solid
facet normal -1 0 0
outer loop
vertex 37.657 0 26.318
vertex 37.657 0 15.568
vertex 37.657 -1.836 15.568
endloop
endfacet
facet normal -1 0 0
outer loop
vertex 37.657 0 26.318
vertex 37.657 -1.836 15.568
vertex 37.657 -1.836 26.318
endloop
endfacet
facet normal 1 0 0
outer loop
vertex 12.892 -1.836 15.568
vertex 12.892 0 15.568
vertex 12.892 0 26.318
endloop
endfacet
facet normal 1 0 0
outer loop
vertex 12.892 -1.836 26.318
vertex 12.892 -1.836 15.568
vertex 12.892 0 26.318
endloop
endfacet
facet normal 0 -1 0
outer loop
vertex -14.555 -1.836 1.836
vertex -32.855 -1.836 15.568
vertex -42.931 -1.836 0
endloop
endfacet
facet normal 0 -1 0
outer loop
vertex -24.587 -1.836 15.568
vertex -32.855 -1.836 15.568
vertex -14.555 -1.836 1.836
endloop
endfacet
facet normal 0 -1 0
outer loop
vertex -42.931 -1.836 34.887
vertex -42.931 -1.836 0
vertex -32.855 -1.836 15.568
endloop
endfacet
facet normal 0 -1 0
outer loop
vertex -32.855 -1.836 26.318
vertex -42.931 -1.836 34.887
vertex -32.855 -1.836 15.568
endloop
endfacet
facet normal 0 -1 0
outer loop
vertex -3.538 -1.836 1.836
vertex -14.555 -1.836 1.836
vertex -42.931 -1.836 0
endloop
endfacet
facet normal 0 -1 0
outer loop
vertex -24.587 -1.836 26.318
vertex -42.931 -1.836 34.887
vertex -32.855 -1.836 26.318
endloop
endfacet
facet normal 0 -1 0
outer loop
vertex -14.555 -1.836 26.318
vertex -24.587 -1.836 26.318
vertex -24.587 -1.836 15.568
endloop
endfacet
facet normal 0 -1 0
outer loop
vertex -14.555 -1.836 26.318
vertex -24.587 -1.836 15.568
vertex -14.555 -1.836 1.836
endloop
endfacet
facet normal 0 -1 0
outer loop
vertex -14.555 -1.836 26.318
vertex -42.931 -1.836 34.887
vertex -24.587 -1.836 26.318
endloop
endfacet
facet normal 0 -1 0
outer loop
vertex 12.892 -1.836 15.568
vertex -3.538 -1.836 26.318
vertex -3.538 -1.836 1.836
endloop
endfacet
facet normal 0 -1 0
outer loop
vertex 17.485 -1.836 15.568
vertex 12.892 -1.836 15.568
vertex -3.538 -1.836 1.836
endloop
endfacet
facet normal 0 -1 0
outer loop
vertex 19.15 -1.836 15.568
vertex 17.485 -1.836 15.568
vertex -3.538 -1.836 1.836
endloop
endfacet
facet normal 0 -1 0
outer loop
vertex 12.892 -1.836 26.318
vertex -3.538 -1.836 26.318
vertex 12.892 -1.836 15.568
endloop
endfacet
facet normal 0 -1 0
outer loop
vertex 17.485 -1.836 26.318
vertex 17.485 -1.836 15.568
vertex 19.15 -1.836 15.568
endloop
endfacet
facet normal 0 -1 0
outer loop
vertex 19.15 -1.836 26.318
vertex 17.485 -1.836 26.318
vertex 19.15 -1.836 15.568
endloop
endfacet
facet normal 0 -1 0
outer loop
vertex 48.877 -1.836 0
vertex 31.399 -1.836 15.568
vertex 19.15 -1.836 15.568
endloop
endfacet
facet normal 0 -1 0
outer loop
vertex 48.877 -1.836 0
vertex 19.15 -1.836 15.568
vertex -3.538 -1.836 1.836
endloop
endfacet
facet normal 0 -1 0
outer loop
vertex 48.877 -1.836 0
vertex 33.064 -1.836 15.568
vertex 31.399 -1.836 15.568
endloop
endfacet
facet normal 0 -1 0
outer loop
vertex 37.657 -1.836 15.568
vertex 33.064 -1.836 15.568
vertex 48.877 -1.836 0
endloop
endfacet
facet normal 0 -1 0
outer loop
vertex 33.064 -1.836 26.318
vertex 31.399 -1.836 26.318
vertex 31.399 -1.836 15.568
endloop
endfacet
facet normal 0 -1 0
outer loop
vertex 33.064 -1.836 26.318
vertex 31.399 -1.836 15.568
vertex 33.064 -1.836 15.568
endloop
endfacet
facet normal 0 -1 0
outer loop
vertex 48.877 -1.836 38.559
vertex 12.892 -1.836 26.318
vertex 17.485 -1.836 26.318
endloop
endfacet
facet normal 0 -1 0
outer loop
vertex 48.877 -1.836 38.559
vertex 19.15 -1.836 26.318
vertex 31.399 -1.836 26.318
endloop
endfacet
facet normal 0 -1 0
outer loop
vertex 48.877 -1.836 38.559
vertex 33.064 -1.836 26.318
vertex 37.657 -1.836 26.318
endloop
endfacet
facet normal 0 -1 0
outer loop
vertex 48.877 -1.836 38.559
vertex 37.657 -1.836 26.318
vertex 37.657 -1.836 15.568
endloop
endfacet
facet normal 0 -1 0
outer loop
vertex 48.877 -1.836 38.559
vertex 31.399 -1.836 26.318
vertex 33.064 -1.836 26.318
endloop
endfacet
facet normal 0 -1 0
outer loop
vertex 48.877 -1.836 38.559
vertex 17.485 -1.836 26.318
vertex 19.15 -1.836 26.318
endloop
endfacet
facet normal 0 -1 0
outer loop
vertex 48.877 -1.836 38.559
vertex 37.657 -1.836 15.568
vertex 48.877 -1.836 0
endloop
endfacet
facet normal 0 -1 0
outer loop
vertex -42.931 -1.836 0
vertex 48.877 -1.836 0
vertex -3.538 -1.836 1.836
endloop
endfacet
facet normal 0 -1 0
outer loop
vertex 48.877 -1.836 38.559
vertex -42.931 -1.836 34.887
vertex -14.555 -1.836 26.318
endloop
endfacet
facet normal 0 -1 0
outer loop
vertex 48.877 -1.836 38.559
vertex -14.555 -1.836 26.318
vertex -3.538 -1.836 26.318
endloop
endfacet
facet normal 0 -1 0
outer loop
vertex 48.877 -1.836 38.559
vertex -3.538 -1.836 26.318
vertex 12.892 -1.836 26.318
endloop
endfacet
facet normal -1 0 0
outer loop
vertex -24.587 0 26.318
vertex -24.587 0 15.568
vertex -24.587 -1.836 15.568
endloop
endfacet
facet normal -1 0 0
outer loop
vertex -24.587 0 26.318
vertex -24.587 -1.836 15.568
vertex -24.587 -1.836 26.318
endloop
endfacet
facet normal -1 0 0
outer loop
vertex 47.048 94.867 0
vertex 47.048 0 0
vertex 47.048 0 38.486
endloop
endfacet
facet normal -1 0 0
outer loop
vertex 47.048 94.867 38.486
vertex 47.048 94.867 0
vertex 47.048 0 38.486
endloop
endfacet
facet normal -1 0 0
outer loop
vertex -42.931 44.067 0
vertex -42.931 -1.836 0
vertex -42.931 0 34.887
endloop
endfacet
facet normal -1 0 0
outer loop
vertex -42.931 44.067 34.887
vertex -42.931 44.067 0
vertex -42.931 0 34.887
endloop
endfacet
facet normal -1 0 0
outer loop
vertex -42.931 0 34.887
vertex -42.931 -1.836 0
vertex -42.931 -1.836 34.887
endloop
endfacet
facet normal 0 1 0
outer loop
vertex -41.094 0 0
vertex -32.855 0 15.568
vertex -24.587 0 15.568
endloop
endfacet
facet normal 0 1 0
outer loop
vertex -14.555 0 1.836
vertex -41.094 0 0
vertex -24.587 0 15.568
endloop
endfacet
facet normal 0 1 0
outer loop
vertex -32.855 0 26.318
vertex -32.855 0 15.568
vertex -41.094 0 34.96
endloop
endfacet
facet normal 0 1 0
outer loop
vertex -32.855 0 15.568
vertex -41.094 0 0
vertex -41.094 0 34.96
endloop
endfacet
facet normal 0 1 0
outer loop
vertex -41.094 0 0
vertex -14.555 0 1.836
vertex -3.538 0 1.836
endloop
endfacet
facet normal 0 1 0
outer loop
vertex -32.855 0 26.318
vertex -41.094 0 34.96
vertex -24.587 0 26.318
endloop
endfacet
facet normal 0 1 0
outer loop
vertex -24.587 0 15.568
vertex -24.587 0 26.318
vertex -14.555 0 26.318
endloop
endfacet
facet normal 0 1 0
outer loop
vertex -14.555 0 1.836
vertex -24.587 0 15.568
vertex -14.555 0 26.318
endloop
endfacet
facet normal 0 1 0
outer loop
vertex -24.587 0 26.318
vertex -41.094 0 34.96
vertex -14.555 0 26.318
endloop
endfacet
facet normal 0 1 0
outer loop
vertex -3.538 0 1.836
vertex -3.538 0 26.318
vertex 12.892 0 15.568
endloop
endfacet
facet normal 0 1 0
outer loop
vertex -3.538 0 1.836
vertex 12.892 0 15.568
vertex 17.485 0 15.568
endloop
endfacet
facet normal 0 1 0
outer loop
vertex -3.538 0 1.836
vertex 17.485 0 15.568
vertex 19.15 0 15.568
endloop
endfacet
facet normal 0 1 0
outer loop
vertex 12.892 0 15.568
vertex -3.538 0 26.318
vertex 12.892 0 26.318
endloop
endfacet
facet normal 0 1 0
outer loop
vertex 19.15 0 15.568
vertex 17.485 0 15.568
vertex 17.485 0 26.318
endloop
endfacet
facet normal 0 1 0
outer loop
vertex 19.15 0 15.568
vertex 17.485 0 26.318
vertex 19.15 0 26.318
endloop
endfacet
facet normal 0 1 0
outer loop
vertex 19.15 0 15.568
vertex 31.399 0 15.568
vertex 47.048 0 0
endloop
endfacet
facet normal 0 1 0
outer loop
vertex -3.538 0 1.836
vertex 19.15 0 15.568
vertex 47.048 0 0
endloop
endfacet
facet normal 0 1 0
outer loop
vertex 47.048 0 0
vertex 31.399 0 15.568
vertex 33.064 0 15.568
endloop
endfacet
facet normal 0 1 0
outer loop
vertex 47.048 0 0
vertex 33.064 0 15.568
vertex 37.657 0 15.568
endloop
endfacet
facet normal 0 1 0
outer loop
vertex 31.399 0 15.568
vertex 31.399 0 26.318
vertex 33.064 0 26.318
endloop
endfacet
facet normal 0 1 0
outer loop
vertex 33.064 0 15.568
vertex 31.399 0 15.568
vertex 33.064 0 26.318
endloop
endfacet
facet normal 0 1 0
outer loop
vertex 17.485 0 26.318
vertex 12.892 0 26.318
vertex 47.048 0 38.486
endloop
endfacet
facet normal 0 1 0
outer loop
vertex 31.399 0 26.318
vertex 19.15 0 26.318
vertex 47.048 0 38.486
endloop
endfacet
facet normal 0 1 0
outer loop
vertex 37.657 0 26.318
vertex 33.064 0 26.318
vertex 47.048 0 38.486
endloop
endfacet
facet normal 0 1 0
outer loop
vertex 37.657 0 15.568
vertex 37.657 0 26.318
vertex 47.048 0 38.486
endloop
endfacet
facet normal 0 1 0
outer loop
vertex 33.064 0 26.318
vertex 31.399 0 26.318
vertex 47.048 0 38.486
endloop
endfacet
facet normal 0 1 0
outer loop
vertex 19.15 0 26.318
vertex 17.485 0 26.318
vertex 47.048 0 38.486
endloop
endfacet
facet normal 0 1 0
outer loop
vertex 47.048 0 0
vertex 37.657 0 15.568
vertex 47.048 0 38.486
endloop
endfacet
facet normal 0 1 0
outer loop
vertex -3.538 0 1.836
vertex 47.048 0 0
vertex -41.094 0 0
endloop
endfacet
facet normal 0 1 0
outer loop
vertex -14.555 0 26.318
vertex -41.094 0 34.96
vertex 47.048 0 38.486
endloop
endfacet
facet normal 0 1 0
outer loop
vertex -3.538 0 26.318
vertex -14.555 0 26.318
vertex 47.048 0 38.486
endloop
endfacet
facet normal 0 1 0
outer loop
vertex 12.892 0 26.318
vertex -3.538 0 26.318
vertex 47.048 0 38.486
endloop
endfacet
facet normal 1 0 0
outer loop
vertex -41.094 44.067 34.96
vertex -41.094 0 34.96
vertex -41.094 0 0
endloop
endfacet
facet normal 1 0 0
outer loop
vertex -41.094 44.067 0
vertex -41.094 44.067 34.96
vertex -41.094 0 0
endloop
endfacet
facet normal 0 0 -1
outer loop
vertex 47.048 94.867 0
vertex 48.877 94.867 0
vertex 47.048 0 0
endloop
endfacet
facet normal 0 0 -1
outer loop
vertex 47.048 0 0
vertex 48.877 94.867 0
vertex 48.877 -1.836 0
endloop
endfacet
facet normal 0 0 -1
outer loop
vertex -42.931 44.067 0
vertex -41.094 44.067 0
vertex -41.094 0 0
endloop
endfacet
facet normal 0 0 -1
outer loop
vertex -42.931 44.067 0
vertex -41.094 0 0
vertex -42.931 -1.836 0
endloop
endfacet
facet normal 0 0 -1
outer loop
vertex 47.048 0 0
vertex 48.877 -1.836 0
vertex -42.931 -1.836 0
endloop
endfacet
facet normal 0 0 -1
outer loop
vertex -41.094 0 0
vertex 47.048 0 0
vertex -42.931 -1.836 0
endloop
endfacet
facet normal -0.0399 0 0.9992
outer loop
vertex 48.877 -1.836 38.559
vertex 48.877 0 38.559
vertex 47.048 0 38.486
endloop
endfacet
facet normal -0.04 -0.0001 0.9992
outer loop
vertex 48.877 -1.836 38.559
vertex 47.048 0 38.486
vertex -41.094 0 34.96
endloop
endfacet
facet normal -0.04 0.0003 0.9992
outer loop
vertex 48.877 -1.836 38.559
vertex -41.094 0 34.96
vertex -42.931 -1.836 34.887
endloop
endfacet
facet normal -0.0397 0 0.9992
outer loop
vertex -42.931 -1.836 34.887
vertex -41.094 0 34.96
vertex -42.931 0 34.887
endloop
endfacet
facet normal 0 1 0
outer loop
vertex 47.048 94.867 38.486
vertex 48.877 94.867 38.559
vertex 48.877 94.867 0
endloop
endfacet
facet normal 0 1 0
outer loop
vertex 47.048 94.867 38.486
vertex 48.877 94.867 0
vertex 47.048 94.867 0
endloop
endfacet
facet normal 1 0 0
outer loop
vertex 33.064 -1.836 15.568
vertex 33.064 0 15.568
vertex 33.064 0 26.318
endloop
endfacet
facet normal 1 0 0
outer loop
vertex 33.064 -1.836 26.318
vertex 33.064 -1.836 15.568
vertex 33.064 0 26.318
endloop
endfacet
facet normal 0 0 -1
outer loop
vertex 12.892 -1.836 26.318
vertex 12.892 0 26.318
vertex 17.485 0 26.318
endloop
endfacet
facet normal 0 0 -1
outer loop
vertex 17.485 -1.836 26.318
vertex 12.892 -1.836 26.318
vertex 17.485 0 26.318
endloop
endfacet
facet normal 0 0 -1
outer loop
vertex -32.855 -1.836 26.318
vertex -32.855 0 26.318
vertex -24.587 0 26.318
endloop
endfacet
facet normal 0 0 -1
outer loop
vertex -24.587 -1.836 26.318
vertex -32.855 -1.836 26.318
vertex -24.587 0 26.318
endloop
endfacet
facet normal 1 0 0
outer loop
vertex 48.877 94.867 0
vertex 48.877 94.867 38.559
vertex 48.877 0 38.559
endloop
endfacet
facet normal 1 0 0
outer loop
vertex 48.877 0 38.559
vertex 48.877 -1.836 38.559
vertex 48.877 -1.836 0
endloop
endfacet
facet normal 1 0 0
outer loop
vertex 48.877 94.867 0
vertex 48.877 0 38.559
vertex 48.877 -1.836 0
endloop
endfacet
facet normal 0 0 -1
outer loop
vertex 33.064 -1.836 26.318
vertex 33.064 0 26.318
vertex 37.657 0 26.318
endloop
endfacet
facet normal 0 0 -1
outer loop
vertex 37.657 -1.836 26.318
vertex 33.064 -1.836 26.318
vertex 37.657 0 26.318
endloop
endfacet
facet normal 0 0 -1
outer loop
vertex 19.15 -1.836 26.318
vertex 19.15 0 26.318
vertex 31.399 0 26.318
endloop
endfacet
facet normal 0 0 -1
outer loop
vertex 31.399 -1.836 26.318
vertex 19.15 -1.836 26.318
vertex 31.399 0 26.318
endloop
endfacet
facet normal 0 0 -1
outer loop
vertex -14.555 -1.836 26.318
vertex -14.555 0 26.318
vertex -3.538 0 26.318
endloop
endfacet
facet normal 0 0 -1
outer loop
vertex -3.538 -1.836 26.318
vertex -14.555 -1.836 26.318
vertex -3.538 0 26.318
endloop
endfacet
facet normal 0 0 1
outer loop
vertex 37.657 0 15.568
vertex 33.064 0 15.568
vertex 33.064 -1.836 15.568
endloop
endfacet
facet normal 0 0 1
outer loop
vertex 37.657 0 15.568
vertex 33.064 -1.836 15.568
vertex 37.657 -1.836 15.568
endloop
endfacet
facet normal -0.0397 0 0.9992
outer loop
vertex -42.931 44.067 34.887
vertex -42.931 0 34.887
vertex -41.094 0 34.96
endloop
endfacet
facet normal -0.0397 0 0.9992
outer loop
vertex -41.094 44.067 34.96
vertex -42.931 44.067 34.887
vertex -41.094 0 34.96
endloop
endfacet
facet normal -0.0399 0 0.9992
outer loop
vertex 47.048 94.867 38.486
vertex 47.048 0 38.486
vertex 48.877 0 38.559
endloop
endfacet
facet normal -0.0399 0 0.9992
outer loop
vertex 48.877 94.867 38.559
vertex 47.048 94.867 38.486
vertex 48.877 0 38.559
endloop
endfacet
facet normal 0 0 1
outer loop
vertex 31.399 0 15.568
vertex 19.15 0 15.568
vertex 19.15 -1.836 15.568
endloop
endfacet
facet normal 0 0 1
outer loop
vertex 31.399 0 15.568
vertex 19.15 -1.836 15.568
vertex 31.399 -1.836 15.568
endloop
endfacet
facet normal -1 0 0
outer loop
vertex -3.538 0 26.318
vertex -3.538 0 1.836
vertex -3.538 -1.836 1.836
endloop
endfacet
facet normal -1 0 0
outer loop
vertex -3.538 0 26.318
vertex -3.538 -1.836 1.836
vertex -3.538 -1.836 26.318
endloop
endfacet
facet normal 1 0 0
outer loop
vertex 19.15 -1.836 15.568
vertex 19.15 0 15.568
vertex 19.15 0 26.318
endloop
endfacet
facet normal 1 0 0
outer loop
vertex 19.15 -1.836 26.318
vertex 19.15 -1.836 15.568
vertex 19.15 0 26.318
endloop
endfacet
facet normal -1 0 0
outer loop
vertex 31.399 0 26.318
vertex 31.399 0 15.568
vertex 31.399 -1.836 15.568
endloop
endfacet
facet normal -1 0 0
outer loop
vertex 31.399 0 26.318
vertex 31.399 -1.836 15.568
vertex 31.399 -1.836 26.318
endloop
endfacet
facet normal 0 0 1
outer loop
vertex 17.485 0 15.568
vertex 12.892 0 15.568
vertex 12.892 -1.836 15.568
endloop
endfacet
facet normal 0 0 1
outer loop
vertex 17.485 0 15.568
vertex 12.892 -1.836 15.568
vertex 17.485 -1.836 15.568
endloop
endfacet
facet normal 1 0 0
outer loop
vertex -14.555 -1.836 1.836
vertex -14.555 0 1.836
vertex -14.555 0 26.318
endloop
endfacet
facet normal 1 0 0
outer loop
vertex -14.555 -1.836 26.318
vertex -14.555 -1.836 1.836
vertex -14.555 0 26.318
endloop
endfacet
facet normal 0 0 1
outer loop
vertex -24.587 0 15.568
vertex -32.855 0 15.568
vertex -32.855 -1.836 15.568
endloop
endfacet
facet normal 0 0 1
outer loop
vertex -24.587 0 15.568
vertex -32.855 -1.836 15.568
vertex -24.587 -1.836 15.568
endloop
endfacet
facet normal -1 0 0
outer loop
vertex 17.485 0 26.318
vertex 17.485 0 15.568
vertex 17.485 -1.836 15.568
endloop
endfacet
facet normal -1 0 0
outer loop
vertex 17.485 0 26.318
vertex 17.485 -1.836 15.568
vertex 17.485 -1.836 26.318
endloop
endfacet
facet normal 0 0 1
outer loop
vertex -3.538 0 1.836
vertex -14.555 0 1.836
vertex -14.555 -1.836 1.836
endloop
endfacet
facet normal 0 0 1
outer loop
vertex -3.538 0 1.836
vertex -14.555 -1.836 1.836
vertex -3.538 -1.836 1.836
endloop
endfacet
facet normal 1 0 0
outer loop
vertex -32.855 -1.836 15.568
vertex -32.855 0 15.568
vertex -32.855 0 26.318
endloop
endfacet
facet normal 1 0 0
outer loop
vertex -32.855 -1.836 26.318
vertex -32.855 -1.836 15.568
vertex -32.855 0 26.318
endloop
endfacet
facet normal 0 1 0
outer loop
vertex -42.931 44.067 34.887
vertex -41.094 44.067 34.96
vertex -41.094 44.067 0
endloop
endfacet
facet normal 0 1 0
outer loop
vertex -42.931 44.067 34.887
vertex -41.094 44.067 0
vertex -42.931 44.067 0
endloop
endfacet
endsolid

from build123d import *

# Parameters (mm, degrees)
F0_W     = 11.016868
F0_H     = 24.481927
F0_W_2   = 8.267472
F0_H_2   = 10.750423
F0_W_3   = 4.593041
F0_W_4   = 12.248872
F0_W_5   = 4.59304
F1_DEPTH = 1.836145
F3_DEPTH = 44.06747
F5_DEPTH = 50.8


with BuildPart() as f1:
    # F0 (on Front) → F1 (new body)
    with BuildSketch(Plane.XZ):
        Polygon((-42.930589, 34.886747), (-42.930589, 0), (48.876639, 0), (48.876639, 38.559036), align=None)
        with Locations((-9.046323, 14.077108)):
            Rectangle(F0_W, F0_H, mode=Mode.SUBTRACT)
        with Locations((-28.720862, 20.94286)):
            Rectangle(F0_W_2, F0_H_2, mode=Mode.SUBTRACT)
        with Locations((15.188605, 20.94286)):
            Rectangle(F0_W_3, F0_H_2, mode=Mode.SUBTRACT)
        with Locations((25.274628, 20.94286)):
            Rectangle(F0_W_4, F0_H_2, mode=Mode.SUBTRACT)
        with Locations((35.360651, 20.94286)):
            Rectangle(F0_W_5, F0_H_2, mode=Mode.SUBTRACT)
    extrude(amount=F1_DEPTH)

    # F2 (on face) → F3 (join)
    with BuildSketch(Plane(origin=(0, 0, 0), x_dir=(-1, 0, 0), z_dir=(0, 1, 0))):
        Polygon((42.930589, 0), (42.930589, 34.886747), (41.094445, 34.960193), (41.094445, 0), align=None)
        Polygon((-47.047839, 38.485884), (-48.876639, 38.559036), (-48.876639, 0), (-47.047839, 0), align=None)
    extrude(amount=F3_DEPTH)

    # F4 (on face) → F5 (join)
    with BuildSketch(Plane(origin=(0, 44.06747, 0), x_dir=(-1, 0, 0), z_dir=(0, 1, 0))):
        Polygon((-47.047839, 38.485884), (-48.876639, 38.559036), (-48.876639, 0), (-47.047839, 0), align=None)
    extrude(amount=F5_DEPTH)


solid = f1.part
